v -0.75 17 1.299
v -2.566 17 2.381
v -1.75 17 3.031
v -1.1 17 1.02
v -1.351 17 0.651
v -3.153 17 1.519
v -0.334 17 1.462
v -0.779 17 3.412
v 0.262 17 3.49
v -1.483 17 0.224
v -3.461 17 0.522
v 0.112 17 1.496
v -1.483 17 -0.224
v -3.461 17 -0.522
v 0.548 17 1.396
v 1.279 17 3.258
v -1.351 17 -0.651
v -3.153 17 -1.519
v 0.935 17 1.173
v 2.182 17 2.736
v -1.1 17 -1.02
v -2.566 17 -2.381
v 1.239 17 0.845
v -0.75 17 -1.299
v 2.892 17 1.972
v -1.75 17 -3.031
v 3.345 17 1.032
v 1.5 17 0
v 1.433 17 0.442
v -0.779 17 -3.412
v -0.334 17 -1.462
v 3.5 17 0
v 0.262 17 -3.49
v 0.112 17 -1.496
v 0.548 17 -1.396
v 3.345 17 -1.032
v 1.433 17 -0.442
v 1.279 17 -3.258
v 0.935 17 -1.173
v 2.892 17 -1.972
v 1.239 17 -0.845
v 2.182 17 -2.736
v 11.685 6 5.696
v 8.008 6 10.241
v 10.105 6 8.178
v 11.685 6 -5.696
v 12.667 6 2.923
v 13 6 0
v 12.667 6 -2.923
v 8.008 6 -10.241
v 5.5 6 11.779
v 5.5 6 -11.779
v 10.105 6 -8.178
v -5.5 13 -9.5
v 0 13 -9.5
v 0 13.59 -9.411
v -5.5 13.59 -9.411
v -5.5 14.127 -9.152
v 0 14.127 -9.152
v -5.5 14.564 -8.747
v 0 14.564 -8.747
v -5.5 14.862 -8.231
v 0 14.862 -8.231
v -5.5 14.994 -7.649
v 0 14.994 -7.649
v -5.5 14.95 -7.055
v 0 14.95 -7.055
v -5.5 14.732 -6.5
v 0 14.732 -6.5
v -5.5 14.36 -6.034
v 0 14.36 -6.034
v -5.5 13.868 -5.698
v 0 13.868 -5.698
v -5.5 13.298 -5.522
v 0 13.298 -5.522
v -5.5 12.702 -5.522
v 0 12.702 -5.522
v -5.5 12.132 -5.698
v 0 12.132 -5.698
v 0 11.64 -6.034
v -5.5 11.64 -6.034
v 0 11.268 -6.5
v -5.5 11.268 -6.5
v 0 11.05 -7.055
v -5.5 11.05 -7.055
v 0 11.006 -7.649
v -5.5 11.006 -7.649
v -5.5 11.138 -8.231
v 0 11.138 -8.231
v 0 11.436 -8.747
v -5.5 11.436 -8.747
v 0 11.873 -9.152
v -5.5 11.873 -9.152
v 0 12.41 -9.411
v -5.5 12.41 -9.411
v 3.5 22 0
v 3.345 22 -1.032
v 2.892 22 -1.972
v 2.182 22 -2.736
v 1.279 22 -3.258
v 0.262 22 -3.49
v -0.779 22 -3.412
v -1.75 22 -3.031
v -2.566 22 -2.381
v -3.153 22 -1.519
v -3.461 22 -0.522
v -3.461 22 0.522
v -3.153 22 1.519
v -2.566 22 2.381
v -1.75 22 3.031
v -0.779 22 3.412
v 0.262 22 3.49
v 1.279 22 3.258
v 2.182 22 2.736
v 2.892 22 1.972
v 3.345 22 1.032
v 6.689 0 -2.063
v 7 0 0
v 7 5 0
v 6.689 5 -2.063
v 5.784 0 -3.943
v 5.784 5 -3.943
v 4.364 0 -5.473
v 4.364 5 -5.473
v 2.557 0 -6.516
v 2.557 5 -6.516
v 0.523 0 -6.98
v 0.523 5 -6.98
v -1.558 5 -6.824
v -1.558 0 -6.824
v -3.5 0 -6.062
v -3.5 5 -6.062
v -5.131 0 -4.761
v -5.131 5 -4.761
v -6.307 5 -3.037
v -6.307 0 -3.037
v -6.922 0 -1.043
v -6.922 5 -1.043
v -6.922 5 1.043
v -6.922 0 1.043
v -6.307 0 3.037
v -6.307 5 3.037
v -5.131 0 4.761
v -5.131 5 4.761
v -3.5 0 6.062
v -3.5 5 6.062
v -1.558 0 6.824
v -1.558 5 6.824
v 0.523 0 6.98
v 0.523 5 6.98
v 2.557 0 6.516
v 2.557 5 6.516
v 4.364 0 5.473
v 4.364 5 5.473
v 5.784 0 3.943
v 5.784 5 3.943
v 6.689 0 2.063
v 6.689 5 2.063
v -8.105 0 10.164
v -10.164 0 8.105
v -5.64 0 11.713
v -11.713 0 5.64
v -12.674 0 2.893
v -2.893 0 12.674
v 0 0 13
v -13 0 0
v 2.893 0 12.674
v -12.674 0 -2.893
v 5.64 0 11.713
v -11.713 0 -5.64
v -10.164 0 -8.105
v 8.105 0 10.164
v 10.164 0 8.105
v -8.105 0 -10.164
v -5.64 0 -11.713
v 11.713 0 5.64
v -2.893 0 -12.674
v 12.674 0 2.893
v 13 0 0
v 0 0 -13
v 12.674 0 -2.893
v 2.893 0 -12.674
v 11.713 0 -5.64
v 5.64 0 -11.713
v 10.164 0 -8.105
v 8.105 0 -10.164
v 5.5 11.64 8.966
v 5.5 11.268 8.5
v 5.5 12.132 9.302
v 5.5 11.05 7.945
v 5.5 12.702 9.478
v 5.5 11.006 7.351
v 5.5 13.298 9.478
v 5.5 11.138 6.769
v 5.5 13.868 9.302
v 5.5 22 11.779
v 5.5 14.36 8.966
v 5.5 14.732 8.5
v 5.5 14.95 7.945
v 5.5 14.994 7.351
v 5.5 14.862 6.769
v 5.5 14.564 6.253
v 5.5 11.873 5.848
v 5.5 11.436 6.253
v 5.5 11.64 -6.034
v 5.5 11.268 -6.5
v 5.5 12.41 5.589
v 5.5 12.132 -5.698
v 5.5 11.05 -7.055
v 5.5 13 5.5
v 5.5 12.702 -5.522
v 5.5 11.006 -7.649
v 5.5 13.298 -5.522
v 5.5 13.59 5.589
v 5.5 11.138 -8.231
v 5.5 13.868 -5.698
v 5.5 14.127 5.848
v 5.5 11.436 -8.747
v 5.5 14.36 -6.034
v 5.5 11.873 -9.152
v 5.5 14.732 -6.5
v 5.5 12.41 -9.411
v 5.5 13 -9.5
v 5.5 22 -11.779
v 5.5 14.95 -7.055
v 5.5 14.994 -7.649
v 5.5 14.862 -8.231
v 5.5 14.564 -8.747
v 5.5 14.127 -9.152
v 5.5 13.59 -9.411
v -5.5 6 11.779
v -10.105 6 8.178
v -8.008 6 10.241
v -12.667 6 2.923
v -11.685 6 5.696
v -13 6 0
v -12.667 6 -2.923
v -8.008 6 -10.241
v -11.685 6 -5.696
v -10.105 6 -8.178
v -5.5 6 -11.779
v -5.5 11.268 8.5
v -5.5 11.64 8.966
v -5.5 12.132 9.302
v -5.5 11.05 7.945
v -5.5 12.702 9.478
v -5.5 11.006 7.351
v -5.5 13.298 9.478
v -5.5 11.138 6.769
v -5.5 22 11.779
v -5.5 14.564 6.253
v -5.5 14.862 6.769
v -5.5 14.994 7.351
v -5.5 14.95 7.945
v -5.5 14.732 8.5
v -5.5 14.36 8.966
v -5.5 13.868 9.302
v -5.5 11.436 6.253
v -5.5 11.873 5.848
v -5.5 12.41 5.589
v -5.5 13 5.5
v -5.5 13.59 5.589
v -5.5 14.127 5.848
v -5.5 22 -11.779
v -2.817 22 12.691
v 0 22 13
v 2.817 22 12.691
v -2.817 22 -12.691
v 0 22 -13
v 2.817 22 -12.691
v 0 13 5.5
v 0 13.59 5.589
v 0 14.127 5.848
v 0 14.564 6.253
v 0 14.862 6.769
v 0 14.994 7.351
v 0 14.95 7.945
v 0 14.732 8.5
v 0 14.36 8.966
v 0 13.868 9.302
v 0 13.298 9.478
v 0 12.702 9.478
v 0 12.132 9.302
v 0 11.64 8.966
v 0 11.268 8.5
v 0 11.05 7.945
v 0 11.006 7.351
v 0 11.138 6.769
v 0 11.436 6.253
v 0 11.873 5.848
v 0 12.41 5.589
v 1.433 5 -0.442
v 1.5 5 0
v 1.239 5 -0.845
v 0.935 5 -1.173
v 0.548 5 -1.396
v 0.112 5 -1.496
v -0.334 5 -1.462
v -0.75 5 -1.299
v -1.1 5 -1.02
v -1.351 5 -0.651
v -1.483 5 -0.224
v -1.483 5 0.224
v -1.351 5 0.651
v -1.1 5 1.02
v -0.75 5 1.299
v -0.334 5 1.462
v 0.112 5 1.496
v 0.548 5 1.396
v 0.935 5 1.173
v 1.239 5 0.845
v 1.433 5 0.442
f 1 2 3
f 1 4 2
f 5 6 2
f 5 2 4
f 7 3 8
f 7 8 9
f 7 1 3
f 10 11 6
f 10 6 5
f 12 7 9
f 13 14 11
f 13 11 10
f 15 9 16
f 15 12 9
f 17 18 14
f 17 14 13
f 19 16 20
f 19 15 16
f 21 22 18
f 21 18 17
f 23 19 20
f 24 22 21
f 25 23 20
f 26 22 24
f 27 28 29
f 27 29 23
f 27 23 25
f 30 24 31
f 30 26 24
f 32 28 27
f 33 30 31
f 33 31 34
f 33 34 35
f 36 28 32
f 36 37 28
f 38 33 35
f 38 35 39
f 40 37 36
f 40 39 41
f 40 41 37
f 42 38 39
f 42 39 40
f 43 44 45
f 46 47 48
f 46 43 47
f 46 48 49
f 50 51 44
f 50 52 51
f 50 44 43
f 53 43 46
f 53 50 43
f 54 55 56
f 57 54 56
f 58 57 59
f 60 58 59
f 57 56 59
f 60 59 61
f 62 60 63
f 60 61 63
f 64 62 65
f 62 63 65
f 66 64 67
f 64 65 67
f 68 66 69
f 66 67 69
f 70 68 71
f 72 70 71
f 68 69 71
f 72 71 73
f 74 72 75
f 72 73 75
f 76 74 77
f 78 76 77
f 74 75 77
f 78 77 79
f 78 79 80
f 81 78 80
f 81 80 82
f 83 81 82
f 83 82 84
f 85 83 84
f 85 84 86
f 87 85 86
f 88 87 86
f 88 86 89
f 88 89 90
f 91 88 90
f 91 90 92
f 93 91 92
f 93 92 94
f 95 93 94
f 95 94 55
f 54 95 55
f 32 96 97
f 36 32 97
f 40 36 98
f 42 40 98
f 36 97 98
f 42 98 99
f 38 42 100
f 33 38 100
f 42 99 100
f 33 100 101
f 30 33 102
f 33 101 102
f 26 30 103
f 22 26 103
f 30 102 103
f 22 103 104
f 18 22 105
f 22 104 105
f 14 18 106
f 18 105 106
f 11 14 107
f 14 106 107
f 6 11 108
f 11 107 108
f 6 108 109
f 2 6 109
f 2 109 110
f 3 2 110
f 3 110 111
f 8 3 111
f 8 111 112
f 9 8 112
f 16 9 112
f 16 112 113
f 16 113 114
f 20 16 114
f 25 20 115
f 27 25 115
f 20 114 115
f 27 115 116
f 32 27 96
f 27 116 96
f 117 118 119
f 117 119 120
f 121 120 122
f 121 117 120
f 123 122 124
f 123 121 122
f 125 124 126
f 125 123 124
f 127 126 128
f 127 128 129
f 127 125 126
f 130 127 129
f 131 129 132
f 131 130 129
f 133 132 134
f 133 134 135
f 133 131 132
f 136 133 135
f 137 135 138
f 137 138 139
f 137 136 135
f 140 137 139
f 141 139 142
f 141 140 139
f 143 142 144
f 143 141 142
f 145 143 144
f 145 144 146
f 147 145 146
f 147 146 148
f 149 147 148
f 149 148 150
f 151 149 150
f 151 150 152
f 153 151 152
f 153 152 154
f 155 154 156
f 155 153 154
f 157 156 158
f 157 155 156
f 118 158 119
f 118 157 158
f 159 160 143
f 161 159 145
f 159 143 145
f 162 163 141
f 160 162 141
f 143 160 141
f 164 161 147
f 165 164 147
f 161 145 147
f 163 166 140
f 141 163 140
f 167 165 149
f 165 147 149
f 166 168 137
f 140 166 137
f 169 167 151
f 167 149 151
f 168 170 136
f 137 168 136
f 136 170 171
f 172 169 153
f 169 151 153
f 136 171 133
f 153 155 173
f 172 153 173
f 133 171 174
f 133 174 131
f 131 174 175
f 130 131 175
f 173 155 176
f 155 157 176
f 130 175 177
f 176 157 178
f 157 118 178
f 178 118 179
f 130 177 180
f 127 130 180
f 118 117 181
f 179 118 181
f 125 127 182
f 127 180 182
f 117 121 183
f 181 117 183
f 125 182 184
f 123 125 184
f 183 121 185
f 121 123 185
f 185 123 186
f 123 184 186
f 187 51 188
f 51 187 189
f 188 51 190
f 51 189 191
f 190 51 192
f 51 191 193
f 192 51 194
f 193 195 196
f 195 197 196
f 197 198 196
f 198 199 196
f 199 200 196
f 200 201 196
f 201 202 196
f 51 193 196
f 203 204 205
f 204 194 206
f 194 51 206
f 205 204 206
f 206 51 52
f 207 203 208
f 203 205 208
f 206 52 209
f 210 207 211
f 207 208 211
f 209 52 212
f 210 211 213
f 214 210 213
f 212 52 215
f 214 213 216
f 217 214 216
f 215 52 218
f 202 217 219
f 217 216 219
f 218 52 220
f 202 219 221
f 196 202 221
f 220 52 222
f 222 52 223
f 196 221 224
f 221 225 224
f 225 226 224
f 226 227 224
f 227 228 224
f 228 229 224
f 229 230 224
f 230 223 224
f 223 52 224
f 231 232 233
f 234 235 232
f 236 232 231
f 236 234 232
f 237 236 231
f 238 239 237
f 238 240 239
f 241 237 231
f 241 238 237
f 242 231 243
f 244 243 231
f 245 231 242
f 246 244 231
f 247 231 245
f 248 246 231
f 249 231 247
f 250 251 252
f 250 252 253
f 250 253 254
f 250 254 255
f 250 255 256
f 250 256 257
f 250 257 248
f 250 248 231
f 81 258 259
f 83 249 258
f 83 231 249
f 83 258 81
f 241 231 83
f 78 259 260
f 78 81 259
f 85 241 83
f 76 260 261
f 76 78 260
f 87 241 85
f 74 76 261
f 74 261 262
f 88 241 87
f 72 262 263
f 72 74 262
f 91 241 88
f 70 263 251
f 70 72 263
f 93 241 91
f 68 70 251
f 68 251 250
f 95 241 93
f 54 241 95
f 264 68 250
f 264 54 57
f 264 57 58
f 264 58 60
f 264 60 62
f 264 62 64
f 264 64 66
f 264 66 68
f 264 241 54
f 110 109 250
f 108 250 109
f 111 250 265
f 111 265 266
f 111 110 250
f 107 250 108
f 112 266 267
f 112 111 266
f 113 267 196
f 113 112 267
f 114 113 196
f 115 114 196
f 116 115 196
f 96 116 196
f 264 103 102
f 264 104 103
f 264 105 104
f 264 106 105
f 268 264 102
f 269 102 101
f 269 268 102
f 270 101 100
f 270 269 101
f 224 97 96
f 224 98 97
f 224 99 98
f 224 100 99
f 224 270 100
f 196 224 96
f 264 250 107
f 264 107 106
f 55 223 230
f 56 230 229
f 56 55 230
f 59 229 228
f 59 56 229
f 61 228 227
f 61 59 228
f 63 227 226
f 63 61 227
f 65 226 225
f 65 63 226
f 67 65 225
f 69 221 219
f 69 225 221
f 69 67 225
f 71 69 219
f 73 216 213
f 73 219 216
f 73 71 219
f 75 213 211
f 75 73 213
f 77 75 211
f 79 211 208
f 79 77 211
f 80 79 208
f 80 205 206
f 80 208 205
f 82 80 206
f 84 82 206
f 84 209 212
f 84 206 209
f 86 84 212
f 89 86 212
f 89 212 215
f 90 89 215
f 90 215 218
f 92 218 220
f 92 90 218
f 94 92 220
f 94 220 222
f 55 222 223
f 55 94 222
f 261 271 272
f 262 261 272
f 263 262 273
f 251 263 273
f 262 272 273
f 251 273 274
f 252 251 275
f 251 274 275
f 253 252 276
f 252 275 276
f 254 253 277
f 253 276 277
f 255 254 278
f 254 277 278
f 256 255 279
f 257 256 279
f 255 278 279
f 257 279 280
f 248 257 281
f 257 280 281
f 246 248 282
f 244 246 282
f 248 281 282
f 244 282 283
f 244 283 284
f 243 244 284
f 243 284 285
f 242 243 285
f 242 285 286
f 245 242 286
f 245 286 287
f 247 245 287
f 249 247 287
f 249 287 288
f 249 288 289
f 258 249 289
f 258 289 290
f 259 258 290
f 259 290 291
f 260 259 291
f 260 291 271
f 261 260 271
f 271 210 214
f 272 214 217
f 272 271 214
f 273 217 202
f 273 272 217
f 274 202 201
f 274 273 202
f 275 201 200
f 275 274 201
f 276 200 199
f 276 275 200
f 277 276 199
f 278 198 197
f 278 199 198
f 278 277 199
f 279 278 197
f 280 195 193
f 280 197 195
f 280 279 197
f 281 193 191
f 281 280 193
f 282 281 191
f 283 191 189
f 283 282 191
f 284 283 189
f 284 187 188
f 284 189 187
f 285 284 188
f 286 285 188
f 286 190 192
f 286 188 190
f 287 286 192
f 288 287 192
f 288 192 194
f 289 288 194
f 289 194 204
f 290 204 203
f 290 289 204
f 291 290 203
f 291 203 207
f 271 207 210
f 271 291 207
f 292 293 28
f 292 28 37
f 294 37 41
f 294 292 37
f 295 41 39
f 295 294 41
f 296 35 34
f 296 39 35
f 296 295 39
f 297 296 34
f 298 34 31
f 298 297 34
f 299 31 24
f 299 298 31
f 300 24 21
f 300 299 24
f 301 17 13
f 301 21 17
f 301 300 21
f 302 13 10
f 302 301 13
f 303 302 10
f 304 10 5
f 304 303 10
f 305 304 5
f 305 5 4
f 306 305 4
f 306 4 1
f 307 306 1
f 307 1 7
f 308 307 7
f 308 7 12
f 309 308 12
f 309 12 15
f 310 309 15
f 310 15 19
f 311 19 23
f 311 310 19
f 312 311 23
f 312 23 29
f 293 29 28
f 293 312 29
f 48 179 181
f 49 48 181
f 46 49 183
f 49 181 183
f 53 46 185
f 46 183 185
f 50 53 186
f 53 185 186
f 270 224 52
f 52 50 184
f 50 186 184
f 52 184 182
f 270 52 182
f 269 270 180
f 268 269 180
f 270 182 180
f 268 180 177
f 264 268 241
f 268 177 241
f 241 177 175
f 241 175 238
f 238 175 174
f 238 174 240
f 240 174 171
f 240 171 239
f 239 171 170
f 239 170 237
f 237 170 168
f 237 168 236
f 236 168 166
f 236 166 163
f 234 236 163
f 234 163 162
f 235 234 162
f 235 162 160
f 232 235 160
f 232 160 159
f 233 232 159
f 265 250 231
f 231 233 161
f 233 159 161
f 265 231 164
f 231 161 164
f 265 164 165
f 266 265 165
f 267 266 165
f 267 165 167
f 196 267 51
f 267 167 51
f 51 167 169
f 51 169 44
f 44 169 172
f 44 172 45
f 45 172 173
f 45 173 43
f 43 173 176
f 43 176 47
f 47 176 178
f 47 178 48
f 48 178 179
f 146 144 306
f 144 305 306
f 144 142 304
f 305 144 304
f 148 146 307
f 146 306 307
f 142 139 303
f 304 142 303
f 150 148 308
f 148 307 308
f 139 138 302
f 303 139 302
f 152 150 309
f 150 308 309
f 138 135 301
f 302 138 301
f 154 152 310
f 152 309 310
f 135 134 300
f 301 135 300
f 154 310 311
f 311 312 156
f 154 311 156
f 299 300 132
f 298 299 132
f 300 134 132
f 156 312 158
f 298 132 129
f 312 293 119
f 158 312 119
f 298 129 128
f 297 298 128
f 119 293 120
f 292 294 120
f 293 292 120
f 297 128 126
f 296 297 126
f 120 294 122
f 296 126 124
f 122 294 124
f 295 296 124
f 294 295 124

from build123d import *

# Parameters (mm, degrees)
SKETCH1_R               = 13
BOSS_EXTRUDE1_DEPTH     = 22
SKETCH2_R               = 7
CUT_EXTRUDE1_DEPTH      = 5
SKETCH3_W               = 8.709717948
SKETCH3_H               = 17.861131539
SKETCH3_W_2             = 9.032332804
SKETCH3_H_2             = 17.802474292
CUT_EXTRUDE2_DEPTH      = 14
CUT_EXTRUDE2_DEPTH_BACK = 14
SKETCH4_R               = 2
CUT_EXTRUDE3_DEPTH      = 14
CUT_EXTRUDE3_DEPTH_BACK = 14
CUT_EXTRUDE4_START      = 22
SKETCH5_R               = 3.5
CUT_EXTRUDE4_DEPTH      = 5
SKETCH6_R               = 1.5
CUT_EXTRUDE5_DEPTH      = 23


with BuildPart() as part:
    # Sketch1 → Boss-Extrude1 (new body)
    with BuildSketch(Plane(origin=(0, 0, 0), x_dir=(1, 0, 0), z_dir=(0, 1, 0))):
        Circle(SKETCH1_R)
    extrude(amount=BOSS_EXTRUDE1_DEPTH)

    # Sketch2 → Cut-Extrude1 (cut)
    with BuildSketch(Plane(origin=(0, 0, 0), x_dir=(1, 0, 0), z_dir=(0, 1, 0))):
        Circle(SKETCH2_R)
    extrude(amount=CUT_EXTRUDE1_DEPTH, mode=Mode.SUBTRACT)

    # Sketch3 → Cut-Extrude2 (cut, two sides)
    with BuildSketch(Plane.XY) as cut_extrude2_sk:
        with Locations((9.854858974, 14.93056577)):
            Rectangle(SKETCH3_W, SKETCH3_H)
        with Locations((-10.016166402, 14.901237146)):
            Rectangle(SKETCH3_W_2, SKETCH3_H_2)
    extrude(amount=CUT_EXTRUDE2_DEPTH, mode=Mode.SUBTRACT)
    extrude(cut_extrude2_sk.sketch, amount=-CUT_EXTRUDE2_DEPTH_BACK, mode=Mode.SUBTRACT)

    # Sketch4 → Cut-Extrude3 (cut, two sides)
    with BuildSketch(Plane(origin=(0, 0, 0), x_dir=(0, 0, -1), z_dir=(1, 0, 0))) as cut_extrude3_sk:
        with Locations((-7.5, 13)):
            Circle(SKETCH4_R)
        with Locations((7.5, 13)):
            Circle(SKETCH4_R)
    extrude(amount=CUT_EXTRUDE3_DEPTH, mode=Mode.SUBTRACT)
    extrude(cut_extrude3_sk.sketch, amount=-CUT_EXTRUDE3_DEPTH_BACK, mode=Mode.SUBTRACT)

    # Sketch5 → Cut-Extrude4 (cut)
    with BuildSketch(Plane(origin=(0, 0, 0), x_dir=(1, 0, 0), z_dir=(0, 1, 0)).offset(CUT_EXTRUDE4_START)):
        Circle(SKETCH5_R)
    extrude(amount=-CUT_EXTRUDE4_DEPTH, mode=Mode.SUBTRACT)

    # Sketch6 → Cut-Extrude5 (cut, through all)
    with BuildSketch(Plane(origin=(0, 0, 0), x_dir=(1, 0, 0), z_dir=(0, 1, 0))):
        Circle(SKETCH6_R)
    extrude(amount=CUT_EXTRUDE5_DEPTH, mode=Mode.SUBTRACT)


solid = part.part
